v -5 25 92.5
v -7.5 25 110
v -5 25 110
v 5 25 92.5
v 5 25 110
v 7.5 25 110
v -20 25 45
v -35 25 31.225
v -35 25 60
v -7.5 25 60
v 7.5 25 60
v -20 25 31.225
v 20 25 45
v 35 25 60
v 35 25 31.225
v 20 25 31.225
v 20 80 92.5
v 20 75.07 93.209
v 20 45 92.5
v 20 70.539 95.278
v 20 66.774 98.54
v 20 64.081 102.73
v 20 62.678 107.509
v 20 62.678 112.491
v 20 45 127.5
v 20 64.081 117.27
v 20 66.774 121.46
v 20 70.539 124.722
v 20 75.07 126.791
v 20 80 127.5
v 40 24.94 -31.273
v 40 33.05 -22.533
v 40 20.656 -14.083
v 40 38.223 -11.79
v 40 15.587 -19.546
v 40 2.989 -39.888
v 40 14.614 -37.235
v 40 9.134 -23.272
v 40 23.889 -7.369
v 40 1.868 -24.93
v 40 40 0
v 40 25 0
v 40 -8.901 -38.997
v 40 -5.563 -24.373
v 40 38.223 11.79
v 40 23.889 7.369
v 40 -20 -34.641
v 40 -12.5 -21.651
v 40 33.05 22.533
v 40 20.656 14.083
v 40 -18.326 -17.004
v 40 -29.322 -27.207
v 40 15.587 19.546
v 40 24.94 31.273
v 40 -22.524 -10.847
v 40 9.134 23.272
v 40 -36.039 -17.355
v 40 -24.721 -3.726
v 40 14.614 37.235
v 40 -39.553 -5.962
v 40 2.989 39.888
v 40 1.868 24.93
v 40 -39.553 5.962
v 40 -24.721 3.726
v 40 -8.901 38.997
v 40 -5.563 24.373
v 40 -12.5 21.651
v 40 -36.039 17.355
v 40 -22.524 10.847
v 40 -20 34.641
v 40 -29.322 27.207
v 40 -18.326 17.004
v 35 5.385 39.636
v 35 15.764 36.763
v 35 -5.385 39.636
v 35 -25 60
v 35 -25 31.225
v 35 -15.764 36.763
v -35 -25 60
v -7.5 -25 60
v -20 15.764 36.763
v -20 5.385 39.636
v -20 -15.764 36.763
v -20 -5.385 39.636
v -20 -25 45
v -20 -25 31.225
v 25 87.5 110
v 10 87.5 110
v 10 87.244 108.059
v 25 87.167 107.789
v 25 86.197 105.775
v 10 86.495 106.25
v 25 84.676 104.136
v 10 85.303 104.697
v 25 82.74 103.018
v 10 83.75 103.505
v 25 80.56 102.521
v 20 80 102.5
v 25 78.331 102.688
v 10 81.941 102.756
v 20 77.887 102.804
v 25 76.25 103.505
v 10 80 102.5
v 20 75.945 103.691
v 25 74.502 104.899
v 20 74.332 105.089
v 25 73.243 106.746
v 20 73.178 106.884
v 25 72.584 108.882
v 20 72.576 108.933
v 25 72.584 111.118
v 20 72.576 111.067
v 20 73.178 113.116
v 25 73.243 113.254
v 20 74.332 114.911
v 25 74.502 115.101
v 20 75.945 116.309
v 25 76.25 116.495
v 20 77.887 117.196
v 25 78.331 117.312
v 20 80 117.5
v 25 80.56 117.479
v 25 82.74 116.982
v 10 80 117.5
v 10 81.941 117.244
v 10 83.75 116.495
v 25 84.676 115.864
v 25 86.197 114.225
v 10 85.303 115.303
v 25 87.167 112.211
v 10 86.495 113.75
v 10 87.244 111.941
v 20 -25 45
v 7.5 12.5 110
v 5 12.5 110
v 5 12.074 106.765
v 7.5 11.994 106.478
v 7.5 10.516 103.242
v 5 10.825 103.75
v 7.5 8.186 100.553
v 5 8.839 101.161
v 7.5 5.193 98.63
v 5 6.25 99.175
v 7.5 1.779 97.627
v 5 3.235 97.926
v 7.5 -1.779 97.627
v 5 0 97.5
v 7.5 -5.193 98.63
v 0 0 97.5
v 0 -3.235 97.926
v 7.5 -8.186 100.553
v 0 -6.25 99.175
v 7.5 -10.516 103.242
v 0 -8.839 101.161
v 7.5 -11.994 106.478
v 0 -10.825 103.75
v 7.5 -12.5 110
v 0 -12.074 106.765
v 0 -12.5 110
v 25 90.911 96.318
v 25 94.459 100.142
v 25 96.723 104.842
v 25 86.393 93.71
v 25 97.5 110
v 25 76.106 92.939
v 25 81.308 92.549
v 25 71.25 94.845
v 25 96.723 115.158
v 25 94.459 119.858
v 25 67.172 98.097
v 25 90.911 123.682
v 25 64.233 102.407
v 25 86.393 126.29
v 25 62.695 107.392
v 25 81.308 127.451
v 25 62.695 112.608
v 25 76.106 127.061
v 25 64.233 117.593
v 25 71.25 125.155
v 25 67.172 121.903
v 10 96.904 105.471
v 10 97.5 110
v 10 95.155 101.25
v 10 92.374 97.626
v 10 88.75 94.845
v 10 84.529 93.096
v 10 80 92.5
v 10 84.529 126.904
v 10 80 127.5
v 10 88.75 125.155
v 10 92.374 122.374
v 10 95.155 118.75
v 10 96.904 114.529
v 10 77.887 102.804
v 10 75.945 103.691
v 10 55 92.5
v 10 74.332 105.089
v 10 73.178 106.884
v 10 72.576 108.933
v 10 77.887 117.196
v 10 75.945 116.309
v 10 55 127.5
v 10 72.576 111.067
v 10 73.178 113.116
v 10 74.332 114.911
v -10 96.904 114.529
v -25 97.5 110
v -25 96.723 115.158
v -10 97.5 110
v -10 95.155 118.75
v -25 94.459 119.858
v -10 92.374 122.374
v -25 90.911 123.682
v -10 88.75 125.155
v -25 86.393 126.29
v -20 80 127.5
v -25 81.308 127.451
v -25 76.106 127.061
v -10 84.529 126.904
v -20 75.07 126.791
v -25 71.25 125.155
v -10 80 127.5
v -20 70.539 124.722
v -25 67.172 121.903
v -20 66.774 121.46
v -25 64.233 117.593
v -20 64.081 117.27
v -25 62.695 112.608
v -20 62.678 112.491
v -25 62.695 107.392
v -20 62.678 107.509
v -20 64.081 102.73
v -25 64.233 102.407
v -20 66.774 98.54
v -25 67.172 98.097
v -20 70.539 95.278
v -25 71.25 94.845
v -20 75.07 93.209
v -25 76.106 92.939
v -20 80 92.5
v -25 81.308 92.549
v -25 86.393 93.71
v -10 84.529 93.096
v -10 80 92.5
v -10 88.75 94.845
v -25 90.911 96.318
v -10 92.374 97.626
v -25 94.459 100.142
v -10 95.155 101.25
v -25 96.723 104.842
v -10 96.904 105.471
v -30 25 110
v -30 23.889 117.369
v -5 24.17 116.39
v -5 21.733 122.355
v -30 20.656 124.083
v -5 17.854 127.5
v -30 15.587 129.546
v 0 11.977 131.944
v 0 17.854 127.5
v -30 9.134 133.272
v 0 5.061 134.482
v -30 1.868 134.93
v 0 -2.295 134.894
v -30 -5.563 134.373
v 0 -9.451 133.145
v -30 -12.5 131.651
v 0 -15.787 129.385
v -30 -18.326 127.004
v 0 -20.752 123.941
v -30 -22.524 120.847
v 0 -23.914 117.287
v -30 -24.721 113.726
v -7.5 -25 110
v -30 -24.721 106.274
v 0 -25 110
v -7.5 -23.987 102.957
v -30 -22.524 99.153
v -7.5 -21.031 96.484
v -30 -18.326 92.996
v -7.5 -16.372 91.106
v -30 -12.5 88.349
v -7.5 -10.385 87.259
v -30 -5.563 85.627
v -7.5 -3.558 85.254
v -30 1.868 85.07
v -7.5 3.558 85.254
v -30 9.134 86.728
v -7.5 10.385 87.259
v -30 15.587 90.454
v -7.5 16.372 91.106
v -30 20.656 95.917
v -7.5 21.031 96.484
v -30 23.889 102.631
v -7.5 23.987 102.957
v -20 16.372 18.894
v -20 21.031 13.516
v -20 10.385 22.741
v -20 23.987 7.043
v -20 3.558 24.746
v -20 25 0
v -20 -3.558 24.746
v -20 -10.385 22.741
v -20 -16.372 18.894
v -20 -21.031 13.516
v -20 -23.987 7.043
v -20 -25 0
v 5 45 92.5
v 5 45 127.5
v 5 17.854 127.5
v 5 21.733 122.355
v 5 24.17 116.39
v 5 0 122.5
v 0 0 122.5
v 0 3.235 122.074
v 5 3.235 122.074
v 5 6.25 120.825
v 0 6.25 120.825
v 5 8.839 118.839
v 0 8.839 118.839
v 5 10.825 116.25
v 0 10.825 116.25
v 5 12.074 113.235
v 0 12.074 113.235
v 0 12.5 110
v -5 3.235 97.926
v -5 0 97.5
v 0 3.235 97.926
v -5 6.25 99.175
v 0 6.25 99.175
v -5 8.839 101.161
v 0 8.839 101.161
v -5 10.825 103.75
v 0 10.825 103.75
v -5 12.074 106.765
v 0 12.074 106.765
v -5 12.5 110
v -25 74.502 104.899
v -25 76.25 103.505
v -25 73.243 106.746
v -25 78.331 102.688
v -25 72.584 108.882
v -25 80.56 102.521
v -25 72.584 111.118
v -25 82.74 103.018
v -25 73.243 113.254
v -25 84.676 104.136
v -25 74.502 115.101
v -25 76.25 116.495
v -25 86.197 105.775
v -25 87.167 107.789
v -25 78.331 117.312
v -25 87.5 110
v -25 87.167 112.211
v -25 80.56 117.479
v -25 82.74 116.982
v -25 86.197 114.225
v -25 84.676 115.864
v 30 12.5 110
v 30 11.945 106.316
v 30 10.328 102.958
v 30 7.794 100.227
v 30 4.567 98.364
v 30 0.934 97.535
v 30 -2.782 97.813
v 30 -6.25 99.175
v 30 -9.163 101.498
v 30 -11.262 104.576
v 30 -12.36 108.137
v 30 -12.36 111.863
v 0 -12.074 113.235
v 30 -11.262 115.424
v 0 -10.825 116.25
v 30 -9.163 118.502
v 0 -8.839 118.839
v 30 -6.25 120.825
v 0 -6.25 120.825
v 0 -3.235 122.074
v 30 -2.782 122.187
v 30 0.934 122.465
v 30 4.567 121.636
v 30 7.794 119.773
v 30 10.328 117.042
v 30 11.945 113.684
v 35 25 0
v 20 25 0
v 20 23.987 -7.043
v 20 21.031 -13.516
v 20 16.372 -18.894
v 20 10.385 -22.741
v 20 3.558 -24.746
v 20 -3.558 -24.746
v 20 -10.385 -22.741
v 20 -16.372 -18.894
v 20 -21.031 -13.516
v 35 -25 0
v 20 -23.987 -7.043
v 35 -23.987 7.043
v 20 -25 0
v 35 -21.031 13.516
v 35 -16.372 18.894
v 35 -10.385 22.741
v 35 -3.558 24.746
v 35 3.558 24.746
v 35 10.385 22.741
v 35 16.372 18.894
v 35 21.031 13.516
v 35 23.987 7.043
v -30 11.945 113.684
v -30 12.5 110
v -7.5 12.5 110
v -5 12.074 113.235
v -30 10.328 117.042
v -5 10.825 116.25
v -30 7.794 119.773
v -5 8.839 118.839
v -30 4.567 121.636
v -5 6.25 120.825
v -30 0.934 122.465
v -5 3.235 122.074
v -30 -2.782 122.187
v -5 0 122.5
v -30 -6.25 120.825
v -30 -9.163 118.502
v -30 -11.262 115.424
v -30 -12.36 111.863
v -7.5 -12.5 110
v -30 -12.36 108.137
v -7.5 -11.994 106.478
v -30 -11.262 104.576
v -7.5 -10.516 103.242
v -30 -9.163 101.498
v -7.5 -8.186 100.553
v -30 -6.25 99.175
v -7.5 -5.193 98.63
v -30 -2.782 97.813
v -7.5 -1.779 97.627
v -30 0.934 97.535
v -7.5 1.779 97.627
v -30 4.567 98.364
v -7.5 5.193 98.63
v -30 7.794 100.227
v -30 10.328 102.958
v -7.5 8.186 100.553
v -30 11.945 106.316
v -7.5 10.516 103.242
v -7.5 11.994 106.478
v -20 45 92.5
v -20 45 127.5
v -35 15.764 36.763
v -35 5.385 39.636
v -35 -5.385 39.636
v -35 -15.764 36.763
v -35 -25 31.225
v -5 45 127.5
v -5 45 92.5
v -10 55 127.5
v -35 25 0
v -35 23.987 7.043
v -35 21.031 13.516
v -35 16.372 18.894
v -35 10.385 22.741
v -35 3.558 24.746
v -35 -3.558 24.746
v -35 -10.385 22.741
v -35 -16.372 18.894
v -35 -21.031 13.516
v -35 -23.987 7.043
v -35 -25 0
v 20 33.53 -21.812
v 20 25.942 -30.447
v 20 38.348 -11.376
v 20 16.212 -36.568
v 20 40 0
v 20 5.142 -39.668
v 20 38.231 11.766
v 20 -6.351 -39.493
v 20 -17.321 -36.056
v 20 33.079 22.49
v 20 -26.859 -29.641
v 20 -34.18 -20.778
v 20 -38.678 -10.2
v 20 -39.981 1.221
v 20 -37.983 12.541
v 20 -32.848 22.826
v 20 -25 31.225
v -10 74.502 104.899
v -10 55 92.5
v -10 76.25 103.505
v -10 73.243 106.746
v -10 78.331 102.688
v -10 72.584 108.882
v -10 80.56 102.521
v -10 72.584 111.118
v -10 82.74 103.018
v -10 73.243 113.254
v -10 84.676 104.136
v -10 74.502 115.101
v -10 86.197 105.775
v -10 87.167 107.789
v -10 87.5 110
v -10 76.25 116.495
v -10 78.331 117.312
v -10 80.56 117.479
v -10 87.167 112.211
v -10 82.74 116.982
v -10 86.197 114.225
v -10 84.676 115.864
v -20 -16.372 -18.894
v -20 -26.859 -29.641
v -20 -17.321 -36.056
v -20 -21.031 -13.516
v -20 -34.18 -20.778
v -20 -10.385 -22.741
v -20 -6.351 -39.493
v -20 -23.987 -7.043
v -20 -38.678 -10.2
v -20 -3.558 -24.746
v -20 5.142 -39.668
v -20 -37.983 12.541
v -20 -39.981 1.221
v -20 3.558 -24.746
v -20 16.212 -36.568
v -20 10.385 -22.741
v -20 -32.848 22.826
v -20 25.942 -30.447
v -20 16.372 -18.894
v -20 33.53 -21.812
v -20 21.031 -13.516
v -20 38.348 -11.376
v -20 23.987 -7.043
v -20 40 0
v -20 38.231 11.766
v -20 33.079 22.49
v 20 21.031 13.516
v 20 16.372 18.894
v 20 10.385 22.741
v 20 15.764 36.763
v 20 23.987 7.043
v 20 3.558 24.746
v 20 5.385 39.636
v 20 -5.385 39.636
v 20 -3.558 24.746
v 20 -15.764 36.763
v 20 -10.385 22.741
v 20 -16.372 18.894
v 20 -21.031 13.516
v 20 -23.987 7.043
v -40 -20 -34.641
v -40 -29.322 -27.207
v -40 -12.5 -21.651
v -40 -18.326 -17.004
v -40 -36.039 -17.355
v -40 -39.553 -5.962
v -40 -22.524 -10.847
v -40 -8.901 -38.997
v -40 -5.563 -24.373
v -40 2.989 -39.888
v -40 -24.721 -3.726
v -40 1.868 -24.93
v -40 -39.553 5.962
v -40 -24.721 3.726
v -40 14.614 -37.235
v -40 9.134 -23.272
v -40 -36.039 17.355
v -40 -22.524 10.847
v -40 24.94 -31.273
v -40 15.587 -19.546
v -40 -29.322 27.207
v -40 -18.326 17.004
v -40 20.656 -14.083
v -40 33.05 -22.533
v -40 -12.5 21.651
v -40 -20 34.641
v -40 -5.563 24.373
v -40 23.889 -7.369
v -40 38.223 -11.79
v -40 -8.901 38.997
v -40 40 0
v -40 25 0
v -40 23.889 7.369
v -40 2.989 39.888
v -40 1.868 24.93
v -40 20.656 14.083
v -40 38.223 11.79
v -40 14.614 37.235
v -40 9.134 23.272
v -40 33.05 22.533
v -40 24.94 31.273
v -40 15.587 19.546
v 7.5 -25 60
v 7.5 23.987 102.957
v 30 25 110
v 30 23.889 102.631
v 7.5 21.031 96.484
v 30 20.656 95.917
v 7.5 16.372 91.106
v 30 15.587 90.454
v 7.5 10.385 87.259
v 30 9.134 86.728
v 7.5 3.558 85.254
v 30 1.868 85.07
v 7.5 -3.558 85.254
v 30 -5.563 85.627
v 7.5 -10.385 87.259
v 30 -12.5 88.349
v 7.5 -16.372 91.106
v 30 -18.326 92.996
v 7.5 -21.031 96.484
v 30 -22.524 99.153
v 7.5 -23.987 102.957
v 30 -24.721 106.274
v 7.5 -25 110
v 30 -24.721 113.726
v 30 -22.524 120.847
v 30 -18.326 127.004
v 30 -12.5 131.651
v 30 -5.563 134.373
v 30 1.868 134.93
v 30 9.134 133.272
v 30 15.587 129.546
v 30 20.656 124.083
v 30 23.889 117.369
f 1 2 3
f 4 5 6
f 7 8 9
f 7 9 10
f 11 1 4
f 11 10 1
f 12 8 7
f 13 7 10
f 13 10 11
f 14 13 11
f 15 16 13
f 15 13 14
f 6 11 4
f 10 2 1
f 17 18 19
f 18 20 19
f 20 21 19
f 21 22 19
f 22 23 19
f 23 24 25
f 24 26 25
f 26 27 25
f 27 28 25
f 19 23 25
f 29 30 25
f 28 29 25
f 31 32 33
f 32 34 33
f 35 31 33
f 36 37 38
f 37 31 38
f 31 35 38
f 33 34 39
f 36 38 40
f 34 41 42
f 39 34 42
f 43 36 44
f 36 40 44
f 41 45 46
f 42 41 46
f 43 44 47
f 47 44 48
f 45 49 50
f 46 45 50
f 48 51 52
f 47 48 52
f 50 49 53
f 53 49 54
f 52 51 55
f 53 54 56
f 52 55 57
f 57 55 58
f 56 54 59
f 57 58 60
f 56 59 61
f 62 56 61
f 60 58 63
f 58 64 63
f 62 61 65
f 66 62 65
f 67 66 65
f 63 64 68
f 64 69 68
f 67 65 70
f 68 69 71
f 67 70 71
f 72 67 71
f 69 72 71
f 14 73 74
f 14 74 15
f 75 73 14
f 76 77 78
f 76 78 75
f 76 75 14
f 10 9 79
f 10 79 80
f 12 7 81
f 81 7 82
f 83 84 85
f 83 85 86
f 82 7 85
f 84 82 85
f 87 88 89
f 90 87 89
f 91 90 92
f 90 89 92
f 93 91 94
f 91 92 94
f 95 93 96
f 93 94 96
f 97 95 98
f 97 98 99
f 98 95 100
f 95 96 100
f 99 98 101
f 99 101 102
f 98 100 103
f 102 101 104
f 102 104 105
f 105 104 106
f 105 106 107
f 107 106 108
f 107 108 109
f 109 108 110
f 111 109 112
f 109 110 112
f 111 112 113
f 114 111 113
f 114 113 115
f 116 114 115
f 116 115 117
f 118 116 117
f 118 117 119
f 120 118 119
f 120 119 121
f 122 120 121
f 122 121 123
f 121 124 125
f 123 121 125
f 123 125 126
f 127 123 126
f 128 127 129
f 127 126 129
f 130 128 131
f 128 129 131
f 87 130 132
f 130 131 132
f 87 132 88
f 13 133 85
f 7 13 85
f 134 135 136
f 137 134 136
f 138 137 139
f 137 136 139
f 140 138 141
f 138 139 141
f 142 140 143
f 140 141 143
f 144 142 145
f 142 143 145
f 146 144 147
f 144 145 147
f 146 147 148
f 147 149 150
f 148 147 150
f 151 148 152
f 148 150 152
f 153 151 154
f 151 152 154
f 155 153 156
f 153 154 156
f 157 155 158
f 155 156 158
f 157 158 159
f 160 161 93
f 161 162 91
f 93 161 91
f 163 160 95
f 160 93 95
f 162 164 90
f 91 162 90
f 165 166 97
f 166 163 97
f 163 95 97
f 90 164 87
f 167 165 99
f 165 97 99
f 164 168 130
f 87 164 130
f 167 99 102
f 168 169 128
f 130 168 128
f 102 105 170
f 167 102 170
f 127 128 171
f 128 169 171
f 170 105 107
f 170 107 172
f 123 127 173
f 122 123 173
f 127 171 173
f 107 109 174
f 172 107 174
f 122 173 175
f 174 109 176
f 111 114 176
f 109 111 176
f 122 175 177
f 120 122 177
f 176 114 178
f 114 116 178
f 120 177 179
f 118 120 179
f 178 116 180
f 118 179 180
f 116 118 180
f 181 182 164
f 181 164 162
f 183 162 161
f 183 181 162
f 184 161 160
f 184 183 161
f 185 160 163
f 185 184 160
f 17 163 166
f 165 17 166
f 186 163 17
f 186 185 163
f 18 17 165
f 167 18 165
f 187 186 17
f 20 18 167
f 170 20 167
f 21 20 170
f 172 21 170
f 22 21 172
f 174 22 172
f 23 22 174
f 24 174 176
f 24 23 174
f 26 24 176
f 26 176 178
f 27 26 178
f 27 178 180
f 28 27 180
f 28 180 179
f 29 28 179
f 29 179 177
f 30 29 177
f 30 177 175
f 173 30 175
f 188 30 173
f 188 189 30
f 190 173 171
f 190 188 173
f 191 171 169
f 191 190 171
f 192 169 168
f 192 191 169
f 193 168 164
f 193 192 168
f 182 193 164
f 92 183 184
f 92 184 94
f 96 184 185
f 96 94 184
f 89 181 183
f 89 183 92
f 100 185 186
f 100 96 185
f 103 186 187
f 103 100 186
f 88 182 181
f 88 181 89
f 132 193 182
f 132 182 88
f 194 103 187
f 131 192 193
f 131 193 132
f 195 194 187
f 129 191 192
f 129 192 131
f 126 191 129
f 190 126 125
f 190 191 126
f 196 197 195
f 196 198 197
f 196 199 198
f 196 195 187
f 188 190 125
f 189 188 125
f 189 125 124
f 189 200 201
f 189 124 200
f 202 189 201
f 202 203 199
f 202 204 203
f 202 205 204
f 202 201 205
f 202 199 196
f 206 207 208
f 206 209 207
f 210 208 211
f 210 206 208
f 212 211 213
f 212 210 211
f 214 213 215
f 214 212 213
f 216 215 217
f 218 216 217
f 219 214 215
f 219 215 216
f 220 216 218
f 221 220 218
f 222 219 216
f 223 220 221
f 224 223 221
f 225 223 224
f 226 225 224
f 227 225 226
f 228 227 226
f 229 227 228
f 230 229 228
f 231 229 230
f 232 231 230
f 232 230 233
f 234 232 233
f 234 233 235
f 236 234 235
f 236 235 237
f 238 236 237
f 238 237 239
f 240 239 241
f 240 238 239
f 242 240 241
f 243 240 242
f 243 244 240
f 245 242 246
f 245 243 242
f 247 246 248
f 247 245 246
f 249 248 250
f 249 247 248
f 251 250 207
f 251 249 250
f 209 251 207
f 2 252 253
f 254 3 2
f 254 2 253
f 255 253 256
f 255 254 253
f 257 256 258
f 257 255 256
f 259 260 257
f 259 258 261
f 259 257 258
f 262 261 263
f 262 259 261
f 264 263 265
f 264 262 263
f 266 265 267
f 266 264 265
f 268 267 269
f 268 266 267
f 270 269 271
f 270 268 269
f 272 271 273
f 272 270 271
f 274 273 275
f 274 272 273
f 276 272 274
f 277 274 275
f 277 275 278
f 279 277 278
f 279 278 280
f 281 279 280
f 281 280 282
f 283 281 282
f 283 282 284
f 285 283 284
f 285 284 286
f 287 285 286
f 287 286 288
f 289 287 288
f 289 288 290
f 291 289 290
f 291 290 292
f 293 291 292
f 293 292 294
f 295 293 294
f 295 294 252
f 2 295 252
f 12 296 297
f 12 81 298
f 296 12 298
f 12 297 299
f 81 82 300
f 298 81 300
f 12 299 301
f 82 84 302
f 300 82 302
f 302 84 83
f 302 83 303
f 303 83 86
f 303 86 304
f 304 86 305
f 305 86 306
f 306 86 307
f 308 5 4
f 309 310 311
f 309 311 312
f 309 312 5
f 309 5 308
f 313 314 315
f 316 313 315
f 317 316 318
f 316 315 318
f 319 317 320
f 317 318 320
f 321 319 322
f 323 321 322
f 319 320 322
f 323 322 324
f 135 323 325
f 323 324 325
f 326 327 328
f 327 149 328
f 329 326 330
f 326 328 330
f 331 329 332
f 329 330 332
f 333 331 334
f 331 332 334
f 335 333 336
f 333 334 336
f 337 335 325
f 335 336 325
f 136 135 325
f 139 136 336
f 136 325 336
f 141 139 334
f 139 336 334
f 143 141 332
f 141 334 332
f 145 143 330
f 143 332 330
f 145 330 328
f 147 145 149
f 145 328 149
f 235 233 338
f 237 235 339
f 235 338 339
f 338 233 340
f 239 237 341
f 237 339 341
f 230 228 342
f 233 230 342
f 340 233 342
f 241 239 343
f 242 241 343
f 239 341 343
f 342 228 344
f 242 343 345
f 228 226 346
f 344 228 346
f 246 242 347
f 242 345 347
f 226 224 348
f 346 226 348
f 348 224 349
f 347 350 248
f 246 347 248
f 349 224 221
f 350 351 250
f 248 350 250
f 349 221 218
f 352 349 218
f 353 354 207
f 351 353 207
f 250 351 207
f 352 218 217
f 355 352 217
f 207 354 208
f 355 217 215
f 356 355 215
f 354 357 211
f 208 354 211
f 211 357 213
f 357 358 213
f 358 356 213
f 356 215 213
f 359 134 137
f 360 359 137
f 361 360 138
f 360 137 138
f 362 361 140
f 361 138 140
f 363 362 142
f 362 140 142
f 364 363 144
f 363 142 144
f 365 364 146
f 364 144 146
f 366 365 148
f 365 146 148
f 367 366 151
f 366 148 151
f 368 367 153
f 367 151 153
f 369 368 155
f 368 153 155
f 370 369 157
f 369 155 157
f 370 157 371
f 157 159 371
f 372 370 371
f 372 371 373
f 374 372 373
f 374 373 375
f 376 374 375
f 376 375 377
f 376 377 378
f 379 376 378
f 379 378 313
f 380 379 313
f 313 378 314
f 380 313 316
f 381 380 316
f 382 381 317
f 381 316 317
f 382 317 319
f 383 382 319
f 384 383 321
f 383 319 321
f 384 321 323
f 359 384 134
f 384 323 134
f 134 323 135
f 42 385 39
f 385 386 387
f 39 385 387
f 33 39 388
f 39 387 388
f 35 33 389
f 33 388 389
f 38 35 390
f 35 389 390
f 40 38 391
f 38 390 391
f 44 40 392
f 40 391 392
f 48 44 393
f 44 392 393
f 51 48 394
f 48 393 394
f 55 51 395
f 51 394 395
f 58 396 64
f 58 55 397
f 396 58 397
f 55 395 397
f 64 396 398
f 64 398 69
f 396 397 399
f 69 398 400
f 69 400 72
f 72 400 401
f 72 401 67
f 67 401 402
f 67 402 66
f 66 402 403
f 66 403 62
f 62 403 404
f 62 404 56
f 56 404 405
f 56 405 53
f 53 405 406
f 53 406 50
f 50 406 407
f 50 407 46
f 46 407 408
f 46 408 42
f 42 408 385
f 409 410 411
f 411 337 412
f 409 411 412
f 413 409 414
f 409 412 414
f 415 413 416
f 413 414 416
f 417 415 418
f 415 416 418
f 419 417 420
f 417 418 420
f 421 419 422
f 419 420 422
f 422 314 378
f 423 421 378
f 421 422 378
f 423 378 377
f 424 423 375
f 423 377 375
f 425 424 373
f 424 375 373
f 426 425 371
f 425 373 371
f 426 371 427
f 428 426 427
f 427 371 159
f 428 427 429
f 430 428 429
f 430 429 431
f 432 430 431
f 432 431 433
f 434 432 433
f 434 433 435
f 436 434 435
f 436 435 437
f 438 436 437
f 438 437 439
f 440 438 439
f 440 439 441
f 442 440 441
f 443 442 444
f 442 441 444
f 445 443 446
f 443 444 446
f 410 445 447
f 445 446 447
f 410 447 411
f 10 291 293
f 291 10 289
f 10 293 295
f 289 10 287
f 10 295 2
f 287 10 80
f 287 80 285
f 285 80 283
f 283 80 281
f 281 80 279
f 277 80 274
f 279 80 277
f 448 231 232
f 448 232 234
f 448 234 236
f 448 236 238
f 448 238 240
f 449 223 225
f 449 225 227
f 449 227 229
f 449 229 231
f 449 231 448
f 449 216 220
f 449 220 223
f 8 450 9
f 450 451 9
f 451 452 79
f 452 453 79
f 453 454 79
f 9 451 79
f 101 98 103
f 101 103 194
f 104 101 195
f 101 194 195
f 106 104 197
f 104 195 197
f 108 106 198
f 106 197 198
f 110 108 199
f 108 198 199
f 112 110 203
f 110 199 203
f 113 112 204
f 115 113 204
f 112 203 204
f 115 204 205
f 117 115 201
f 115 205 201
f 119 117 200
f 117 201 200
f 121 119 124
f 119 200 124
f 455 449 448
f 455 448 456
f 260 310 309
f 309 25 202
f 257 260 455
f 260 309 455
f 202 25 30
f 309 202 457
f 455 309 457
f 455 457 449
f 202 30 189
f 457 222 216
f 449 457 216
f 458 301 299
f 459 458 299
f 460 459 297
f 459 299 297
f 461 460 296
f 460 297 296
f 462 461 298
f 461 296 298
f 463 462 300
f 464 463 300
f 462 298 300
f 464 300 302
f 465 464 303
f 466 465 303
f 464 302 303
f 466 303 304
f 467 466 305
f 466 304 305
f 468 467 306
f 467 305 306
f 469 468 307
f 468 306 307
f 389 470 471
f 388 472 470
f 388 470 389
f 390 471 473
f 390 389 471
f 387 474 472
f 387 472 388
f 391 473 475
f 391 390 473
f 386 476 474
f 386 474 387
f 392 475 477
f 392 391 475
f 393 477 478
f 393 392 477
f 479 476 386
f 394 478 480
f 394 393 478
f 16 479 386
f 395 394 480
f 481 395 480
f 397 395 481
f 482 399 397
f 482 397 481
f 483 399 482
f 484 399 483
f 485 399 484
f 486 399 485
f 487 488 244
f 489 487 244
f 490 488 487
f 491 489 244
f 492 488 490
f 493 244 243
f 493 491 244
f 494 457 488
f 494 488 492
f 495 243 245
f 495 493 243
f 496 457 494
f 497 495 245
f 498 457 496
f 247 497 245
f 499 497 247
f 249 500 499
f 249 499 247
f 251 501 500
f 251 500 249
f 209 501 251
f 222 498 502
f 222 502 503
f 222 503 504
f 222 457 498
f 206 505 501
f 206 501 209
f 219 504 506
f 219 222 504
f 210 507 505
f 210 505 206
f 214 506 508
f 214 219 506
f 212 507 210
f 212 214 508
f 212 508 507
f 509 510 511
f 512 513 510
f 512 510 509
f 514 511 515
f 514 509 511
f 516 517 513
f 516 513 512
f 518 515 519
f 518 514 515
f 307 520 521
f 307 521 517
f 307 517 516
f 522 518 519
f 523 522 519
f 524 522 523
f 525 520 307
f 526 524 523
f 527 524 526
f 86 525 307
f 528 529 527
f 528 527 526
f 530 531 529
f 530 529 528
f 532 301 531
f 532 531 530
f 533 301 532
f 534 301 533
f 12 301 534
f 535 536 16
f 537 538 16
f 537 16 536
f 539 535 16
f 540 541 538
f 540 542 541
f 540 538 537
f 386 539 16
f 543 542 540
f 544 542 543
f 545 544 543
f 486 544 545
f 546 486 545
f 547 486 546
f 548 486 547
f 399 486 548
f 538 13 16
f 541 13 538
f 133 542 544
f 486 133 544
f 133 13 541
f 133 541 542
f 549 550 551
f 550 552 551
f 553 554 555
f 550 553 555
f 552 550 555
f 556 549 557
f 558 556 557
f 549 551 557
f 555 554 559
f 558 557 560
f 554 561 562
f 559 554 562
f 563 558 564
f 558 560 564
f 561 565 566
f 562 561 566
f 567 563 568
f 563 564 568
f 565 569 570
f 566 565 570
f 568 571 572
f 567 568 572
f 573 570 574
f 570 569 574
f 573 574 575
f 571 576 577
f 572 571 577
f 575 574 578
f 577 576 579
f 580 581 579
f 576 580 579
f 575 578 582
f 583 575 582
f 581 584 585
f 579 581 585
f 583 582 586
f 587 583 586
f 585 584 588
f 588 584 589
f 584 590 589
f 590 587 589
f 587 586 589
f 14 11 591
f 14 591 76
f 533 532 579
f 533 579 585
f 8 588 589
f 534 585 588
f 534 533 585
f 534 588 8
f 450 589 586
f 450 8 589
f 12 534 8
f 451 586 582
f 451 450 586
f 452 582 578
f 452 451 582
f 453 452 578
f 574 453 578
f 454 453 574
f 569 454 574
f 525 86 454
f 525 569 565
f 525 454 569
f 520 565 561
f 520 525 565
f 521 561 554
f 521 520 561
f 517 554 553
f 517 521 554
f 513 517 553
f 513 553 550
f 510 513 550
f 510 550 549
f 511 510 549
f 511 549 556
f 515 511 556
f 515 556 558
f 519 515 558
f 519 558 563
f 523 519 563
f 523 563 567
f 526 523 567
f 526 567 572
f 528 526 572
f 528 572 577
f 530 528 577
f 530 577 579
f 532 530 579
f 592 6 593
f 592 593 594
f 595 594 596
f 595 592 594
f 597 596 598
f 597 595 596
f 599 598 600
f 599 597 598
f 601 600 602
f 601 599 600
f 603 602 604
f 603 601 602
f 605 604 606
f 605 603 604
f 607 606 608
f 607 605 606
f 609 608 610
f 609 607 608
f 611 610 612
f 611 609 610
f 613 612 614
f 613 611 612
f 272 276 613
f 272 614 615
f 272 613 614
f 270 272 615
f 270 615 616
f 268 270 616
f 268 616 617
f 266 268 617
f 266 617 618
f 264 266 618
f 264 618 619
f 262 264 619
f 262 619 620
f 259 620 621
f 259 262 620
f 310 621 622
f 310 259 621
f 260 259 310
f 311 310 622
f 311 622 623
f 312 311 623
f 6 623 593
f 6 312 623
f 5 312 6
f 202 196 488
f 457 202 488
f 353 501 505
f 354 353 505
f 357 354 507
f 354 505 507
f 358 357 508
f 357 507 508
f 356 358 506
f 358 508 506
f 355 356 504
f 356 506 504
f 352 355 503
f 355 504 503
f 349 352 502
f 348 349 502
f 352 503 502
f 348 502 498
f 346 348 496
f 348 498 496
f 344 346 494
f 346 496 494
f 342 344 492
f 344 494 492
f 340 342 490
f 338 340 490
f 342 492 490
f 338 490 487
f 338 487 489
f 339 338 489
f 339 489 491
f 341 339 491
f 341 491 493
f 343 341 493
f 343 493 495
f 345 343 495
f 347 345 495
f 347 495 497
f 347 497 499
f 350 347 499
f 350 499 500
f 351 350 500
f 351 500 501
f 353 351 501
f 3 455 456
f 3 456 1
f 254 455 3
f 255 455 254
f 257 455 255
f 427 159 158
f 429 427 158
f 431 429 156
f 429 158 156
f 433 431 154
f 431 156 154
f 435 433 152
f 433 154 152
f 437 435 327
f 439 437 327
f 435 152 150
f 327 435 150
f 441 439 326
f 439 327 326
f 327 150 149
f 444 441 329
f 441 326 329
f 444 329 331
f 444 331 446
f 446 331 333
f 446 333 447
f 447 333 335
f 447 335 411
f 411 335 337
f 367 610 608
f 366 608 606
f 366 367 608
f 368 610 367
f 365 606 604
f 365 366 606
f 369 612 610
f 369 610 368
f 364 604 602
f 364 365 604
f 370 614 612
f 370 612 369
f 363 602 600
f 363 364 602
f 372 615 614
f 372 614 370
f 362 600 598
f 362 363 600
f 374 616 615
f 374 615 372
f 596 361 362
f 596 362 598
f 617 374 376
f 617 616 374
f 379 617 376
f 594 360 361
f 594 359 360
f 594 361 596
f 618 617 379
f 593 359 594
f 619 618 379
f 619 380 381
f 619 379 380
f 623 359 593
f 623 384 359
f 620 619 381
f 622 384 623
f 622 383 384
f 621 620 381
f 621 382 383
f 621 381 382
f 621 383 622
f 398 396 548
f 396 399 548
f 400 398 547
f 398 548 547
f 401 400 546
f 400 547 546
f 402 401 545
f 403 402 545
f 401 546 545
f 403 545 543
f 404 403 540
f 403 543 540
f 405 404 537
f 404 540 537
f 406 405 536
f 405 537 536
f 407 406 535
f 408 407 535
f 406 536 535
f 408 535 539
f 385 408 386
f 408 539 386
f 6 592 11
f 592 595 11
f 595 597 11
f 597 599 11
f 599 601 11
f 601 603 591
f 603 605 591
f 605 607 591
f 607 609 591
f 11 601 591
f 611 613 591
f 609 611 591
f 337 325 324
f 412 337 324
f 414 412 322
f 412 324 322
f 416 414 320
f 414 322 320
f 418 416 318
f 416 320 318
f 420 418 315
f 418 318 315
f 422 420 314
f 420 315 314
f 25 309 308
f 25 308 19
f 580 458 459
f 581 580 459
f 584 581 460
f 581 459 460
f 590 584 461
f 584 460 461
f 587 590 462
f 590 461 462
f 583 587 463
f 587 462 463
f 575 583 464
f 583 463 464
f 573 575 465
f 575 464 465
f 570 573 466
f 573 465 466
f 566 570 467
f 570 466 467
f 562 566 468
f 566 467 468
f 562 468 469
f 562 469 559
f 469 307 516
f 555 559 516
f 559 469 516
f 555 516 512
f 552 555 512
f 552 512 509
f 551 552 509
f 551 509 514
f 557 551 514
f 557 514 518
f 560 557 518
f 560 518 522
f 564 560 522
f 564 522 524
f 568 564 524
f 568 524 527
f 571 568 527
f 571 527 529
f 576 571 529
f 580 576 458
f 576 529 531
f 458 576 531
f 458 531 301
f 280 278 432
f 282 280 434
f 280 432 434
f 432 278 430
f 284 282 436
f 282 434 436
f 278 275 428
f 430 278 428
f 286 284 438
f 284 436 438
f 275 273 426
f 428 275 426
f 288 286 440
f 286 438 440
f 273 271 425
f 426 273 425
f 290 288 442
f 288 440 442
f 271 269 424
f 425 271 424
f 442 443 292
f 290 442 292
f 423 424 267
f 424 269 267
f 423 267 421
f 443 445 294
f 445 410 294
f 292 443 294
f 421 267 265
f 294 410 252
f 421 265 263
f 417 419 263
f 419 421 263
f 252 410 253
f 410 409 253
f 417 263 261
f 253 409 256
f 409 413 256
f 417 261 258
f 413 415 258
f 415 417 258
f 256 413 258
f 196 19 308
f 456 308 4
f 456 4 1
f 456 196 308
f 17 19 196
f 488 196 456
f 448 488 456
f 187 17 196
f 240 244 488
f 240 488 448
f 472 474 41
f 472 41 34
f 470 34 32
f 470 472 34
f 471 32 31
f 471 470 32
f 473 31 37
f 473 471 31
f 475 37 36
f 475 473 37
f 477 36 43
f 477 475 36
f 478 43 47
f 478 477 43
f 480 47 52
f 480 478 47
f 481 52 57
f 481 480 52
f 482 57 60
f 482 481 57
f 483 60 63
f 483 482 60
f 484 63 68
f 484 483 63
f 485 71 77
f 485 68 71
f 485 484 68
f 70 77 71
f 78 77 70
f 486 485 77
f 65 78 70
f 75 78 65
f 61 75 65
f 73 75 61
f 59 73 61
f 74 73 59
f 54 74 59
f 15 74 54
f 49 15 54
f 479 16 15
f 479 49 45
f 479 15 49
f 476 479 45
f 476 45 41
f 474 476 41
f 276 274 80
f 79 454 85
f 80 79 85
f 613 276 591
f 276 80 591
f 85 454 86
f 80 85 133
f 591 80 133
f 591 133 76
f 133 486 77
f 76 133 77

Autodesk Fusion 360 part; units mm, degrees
sketch "Sketch1" plane through (0, 0, 0) normal (0, 1, 0) x (1, 0, 0)
  circle A0 centre (0, 0) radius 12.5
  circle A1 centre (0, 0) radius 25
  circle A2 centre (0, 110) radius 25
  circle A3 centre (0, 110) radius 40
  circle A4 centre (-80, 0) radius 7.5
  circle A5 centre (-80, 0) radius 17.5
  dimension "d1" = 25
  dimension "d2" = 50
  dimension "d3" = 50
  dimension "d4" = 80
  dimension "d5" = 15
  dimension "d6" = 35
  dimension "d7" = 110
  dimension "d8" = 80
sketch "Sketch2" plane through (0, 0, 0) normal (1, 0, 0) x (0, 1, 0)
  circle A0 centre (0, 0) radius 25
  circle A1 centre (0, 0) radius 40
  circle A2 centre (0, 110) radius 12.5
  circle A3 centre (0, 110) radius 25
  circle A4 centre (80, 110) radius 7.5
  circle A5 centre (80, 110) radius 17.5
  dimension "d19" = 50
  dimension "d20" = 80
  dimension "d21" = 25
  dimension "d22" = 50
  dimension "d23" = 15
  dimension "d24" = 35
  dimension "d25" = 110
  dimension "d26" = 80
  dimension "d27" = 110
extrude "Extrude6" add sketch "Sketch2" against normal blind 20 from surface at -20 contours A1 makes body 1
extrude "Extrude7" add sketch "Sketch2" against normal blind 15 from surface at -10 separate body contours A5 makes body 2
extrude "Extrude8" add sketch "Sketch2" along normal mid plane 60 separate body contours A3 makes body 3
mirror "Mirror1" about plane through (0, 0, 0) normal (1, 0, 0) of bodies 2 1 makes body 4 at (33.3333, 39.9503, -1.9938) makes body 5 at (20, 97.413, 108.2576)
sketch "Sketch3" plane through (0, 0, 0) normal (0, 1, 0) x (1, 0, 0)
  line L0 (40, 0) -> (40, -40)
  line L1 (40, 40) -> (40, 0)
  line L2 (20, 0) -> (20, 40)
  line L3 (20, -40) -> (20, 0)
  line L4 (40, 40) -> (20, 40)
  line L5 (40, -40) -> (20, -40)
  line L6 (-40, 0) -> (-40, -40)
  line L7 (-40, 40) -> (-40, 0)
  line L8 (-20, 0) -> (-20, 40)
  line L9 (-20, -40) -> (-20, 0)
  line L10 (-20, 40) -> (-40, 40)
  line L11 (-20, -40) -> (-40, -40)
  line L12 (-30, -110) -> (-30, -135)
  line L13 (-30, -85) -> (-30, -110)
  line L14 (30, -110) -> (30, -85)
  line L15 (30, -135) -> (30, -110)
  line L16 (-30, -135) -> (30, -135)
  line L17 (-30, -85) -> (30, -85)
  line L18 (-20, 0) -> (-35, 0)
  line L19 (-35, 0) -> (-35, -45)
  line L20 (-35, -45) -> (-20, -45)
  line L21 (-20, -45) -> (-20, 0)
  line L22 (20, 0) -> (35, 0)
  line L23 (35, 0) -> (35, -45)
  line L24 (35, -45) -> (20, -45)
  line L25 (20, -45) -> (20, 0)
  line L26 (35, -45) -> (-35, -45)
  line L27 (-35, -45) -> (-35, -60)
  line L28 (-35, -60) -> (35, -60)
  line L29 (35, -60) -> (35, -45)
  line L30 (7.5, -45) -> (-7.5, -45)
  line L31 (-7.5, -45) -> (-7.5, -110)
  line L32 (-7.5, -110) -> (7.5, -110)
  line L33 (7.5, -110) -> (7.5, -45)
  dimension "d38" = 15
  dimension "d39" = 45
  dimension "d40" = 15
  dimension "d41" = 45
  dimension "d42" = 15
  dimension "d43" = 15
  dimension "d44" = 65
  dimension "d45" = 27.5
extrude "Extrude9" add sketch "Sketch3" along normal mid plane 50 separate body contours L5 L23 L24 L25 L26 | L3 L5 L22 L23 L25 | L24 L26 L28 L29 L33 | L26 L28 L30 L31 L33 | L17 L28 L31 L33 | L20 L26 L27 L28 L31 | L17 L31 L32 L33 | L11 L19 L20 L21 L26 | L9 L11 L18 L19 L21 makes body 6
extrude "Extrude10" cut sketch "Sketch2" along normal through all and the other way through all contours A0 | A2 bodies 6
ref_plane "WorkPlane1" through (-17.5, 80, 110) normal (0, 0, -1) x (-1, 0, 0)
sketch "Sketch4" plane through (0, 0, 110) normal (0, 0, -1) x (-1, 0, 0)
  line L0 (-25, 62.5) -> (-25, 97.5)
  line L1 (-10, 97.5) -> (-10, 62.5)
  line L2 (-25, 62.5) -> (-10, 62.5)
  line L3 (-25, 97.5) -> (-10, 97.5)
  line L4 (25, 62.5) -> (25, 97.5)
  line L5 (10, 97.5) -> (10, 62.5)
  line L6 (10, 62.5) -> (25, 62.5)
  line L7 (10, 97.5) -> (25, 97.5)
  line L8 (30, -25) -> (30, 25)
  line L9 (-30, 25) -> (-30, -25)
  line L10 (30, 25) -> (-30, 25)
  line L11 (30, -25) -> (-30, -25)
  line L12 (10, 80) -> (20, 80)
  line L13 (20, 80) -> (20, 55)
  line L14 (20, 55) -> (10, 55)
  line L15 (10, 55) -> (10, 80)
  line L16 (-10, 80) -> (-20, 80)
  line L17 (-20, 80) -> (-20, 55)
  line L18 (-20, 55) -> (-10, 55)
  line L19 (-10, 55) -> (-10, 80)
  line L20 (-20, 55) -> (20, 55)
  line L21 (20, 55) -> (20, 45)
  line L22 (20, 45) -> (-20, 45)
  line L23 (-20, 45) -> (-20, 55)
  line L24 (-5, 55) -> (5, 55)
  line L25 (5, 55) -> (5, 0)
  line L26 (5, 0) -> (-5, 0)
  line L27 (-5, 0) -> (-5, 55)
  dimension "d50" = 10
  dimension "d51" = 25
  dimension "d52" = 10
  dimension "d53" = 25
  dimension "d54" = 10
  dimension "d55" = 10
  dimension "d56" = 55
  dimension "d57" = 15
  dimension "d58" = 15
extrude "Extrude11" add sketch "Sketch4" along normal mid plane 35 separate body contours L1 L2 L16 L17 L19 | L2 L17 L18 L19 L20 | L18 L20 L22 L23 L27 | L20 L22 L24 L25 L27 | L10 L22 L25 L27 | L14 L20 L21 L22 L25 | L10 L25 L26 L27 | L6 L13 L14 L15 L20 | L5 L6 L12 L13 L15 makes body 7
extrude "Extrude12" cut sketch "Sketch2" along normal through all and the other way through all contours A2 | A4 bodies 7
combine "Combine1" operation add target body 3 tool bodies 6 7 2 5 1 4
